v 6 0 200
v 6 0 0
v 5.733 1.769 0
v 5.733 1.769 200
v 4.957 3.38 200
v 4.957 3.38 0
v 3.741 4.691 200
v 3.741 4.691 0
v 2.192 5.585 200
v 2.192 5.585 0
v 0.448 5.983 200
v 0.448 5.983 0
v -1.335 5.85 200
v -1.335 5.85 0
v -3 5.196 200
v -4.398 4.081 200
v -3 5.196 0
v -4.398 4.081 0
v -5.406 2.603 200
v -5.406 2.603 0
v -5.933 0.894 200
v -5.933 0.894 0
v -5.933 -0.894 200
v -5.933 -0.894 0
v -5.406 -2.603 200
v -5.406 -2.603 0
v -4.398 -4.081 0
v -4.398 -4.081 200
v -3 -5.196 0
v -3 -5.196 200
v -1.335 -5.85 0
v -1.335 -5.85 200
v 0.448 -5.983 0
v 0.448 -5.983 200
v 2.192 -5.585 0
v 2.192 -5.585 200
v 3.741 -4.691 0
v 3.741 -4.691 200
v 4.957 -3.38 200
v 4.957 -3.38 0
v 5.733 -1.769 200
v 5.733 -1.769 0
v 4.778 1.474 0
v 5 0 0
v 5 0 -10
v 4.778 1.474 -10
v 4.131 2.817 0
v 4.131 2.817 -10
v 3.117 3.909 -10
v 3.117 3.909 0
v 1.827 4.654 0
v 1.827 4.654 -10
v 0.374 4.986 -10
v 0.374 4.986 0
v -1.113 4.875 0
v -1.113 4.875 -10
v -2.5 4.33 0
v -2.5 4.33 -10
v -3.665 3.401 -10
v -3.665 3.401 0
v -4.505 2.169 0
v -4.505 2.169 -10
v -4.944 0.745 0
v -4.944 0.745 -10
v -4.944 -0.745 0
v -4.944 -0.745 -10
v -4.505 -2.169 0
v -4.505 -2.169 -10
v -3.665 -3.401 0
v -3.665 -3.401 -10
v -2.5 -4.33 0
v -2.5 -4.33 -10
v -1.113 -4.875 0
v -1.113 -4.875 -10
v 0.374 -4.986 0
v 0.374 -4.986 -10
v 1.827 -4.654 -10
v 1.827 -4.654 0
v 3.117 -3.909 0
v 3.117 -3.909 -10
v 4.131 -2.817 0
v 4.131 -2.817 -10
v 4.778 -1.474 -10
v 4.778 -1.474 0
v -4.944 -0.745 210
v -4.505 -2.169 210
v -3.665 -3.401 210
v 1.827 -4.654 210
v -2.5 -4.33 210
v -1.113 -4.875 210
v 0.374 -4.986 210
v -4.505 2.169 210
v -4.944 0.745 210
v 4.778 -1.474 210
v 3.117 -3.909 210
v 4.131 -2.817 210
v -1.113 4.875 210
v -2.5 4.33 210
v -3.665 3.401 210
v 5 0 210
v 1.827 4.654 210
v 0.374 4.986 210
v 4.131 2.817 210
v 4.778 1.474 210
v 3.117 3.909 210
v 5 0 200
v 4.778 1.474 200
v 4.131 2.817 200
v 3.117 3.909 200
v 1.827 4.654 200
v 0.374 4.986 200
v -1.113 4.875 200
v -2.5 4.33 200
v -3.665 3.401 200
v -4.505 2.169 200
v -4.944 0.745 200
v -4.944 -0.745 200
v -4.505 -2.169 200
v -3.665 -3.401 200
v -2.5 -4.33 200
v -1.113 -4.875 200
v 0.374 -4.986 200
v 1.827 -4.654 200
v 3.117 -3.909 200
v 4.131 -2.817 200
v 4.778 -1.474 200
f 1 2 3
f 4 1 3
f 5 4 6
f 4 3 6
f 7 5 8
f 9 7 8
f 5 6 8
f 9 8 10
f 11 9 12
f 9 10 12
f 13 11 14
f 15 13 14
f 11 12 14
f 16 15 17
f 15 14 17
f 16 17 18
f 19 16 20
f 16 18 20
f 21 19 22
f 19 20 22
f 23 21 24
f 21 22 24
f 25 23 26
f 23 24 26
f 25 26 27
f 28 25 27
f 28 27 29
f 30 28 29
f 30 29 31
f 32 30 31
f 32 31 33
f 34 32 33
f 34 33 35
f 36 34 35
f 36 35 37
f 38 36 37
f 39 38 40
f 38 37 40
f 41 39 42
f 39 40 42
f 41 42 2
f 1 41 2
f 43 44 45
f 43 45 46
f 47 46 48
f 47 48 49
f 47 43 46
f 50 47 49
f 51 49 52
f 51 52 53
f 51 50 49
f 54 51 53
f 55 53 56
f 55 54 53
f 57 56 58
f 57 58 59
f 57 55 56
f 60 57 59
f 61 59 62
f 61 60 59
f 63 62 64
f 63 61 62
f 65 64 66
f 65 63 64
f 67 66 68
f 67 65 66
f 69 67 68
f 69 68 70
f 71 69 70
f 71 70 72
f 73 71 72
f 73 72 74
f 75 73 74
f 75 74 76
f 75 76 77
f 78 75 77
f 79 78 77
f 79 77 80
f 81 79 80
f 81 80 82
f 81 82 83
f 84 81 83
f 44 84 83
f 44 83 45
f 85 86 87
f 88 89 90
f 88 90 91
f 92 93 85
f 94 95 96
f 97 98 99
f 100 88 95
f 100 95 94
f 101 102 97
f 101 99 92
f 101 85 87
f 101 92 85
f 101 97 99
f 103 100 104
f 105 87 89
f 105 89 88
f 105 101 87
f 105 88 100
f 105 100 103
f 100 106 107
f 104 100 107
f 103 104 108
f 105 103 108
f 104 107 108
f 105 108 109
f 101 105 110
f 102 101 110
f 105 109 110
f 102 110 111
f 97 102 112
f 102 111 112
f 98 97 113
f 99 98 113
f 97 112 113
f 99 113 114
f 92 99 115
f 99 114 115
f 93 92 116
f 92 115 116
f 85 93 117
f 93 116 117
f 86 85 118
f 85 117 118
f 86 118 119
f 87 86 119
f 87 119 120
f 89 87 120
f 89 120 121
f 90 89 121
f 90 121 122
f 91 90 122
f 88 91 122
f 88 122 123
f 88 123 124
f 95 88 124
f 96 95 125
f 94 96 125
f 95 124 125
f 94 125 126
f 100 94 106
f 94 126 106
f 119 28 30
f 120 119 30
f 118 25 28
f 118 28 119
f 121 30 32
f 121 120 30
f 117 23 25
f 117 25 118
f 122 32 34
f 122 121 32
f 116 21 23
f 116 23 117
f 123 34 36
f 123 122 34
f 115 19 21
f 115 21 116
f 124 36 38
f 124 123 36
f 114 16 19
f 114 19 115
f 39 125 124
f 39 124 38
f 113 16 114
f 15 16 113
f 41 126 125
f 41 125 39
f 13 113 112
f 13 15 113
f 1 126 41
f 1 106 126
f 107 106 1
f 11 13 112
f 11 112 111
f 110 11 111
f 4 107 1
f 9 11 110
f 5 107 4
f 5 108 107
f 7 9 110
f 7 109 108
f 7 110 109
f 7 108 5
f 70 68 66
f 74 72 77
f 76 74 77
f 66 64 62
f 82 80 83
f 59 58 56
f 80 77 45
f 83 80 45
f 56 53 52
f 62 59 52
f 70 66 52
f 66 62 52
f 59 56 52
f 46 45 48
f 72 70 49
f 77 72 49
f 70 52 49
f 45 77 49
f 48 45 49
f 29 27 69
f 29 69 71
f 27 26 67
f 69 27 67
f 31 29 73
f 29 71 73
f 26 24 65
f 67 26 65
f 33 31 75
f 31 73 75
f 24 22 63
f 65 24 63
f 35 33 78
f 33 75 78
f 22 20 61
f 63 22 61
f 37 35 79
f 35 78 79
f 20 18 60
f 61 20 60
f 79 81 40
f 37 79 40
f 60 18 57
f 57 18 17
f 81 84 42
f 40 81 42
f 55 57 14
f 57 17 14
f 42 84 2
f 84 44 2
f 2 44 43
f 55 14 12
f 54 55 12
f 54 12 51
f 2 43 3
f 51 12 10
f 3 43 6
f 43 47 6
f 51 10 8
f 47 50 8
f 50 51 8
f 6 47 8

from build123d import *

# Parameters (mm, degrees)
F0_R     = 6
F1_DEPTH = 200
F3_R     = 5
F4_DEPTH = 10
F5_DEPTH = 210


with BuildPart() as f1:
    # F0 (on Top) → F1 (new body)
    with BuildSketch(Plane.XY):
        Circle(F0_R)
    extrude(amount=F1_DEPTH)

    # F3 (on face) → F4 (join)
    with BuildSketch(Plane.XY.offset(200)):
        Circle(F3_R)
    extrude(amount=F4_DEPTH)

    # F3 (on face) → F5 (join)
    with BuildSketch(Plane.XY.offset(200)):
        Circle(F3_R)
    extrude(amount=-F5_DEPTH)


solid = f1.part
